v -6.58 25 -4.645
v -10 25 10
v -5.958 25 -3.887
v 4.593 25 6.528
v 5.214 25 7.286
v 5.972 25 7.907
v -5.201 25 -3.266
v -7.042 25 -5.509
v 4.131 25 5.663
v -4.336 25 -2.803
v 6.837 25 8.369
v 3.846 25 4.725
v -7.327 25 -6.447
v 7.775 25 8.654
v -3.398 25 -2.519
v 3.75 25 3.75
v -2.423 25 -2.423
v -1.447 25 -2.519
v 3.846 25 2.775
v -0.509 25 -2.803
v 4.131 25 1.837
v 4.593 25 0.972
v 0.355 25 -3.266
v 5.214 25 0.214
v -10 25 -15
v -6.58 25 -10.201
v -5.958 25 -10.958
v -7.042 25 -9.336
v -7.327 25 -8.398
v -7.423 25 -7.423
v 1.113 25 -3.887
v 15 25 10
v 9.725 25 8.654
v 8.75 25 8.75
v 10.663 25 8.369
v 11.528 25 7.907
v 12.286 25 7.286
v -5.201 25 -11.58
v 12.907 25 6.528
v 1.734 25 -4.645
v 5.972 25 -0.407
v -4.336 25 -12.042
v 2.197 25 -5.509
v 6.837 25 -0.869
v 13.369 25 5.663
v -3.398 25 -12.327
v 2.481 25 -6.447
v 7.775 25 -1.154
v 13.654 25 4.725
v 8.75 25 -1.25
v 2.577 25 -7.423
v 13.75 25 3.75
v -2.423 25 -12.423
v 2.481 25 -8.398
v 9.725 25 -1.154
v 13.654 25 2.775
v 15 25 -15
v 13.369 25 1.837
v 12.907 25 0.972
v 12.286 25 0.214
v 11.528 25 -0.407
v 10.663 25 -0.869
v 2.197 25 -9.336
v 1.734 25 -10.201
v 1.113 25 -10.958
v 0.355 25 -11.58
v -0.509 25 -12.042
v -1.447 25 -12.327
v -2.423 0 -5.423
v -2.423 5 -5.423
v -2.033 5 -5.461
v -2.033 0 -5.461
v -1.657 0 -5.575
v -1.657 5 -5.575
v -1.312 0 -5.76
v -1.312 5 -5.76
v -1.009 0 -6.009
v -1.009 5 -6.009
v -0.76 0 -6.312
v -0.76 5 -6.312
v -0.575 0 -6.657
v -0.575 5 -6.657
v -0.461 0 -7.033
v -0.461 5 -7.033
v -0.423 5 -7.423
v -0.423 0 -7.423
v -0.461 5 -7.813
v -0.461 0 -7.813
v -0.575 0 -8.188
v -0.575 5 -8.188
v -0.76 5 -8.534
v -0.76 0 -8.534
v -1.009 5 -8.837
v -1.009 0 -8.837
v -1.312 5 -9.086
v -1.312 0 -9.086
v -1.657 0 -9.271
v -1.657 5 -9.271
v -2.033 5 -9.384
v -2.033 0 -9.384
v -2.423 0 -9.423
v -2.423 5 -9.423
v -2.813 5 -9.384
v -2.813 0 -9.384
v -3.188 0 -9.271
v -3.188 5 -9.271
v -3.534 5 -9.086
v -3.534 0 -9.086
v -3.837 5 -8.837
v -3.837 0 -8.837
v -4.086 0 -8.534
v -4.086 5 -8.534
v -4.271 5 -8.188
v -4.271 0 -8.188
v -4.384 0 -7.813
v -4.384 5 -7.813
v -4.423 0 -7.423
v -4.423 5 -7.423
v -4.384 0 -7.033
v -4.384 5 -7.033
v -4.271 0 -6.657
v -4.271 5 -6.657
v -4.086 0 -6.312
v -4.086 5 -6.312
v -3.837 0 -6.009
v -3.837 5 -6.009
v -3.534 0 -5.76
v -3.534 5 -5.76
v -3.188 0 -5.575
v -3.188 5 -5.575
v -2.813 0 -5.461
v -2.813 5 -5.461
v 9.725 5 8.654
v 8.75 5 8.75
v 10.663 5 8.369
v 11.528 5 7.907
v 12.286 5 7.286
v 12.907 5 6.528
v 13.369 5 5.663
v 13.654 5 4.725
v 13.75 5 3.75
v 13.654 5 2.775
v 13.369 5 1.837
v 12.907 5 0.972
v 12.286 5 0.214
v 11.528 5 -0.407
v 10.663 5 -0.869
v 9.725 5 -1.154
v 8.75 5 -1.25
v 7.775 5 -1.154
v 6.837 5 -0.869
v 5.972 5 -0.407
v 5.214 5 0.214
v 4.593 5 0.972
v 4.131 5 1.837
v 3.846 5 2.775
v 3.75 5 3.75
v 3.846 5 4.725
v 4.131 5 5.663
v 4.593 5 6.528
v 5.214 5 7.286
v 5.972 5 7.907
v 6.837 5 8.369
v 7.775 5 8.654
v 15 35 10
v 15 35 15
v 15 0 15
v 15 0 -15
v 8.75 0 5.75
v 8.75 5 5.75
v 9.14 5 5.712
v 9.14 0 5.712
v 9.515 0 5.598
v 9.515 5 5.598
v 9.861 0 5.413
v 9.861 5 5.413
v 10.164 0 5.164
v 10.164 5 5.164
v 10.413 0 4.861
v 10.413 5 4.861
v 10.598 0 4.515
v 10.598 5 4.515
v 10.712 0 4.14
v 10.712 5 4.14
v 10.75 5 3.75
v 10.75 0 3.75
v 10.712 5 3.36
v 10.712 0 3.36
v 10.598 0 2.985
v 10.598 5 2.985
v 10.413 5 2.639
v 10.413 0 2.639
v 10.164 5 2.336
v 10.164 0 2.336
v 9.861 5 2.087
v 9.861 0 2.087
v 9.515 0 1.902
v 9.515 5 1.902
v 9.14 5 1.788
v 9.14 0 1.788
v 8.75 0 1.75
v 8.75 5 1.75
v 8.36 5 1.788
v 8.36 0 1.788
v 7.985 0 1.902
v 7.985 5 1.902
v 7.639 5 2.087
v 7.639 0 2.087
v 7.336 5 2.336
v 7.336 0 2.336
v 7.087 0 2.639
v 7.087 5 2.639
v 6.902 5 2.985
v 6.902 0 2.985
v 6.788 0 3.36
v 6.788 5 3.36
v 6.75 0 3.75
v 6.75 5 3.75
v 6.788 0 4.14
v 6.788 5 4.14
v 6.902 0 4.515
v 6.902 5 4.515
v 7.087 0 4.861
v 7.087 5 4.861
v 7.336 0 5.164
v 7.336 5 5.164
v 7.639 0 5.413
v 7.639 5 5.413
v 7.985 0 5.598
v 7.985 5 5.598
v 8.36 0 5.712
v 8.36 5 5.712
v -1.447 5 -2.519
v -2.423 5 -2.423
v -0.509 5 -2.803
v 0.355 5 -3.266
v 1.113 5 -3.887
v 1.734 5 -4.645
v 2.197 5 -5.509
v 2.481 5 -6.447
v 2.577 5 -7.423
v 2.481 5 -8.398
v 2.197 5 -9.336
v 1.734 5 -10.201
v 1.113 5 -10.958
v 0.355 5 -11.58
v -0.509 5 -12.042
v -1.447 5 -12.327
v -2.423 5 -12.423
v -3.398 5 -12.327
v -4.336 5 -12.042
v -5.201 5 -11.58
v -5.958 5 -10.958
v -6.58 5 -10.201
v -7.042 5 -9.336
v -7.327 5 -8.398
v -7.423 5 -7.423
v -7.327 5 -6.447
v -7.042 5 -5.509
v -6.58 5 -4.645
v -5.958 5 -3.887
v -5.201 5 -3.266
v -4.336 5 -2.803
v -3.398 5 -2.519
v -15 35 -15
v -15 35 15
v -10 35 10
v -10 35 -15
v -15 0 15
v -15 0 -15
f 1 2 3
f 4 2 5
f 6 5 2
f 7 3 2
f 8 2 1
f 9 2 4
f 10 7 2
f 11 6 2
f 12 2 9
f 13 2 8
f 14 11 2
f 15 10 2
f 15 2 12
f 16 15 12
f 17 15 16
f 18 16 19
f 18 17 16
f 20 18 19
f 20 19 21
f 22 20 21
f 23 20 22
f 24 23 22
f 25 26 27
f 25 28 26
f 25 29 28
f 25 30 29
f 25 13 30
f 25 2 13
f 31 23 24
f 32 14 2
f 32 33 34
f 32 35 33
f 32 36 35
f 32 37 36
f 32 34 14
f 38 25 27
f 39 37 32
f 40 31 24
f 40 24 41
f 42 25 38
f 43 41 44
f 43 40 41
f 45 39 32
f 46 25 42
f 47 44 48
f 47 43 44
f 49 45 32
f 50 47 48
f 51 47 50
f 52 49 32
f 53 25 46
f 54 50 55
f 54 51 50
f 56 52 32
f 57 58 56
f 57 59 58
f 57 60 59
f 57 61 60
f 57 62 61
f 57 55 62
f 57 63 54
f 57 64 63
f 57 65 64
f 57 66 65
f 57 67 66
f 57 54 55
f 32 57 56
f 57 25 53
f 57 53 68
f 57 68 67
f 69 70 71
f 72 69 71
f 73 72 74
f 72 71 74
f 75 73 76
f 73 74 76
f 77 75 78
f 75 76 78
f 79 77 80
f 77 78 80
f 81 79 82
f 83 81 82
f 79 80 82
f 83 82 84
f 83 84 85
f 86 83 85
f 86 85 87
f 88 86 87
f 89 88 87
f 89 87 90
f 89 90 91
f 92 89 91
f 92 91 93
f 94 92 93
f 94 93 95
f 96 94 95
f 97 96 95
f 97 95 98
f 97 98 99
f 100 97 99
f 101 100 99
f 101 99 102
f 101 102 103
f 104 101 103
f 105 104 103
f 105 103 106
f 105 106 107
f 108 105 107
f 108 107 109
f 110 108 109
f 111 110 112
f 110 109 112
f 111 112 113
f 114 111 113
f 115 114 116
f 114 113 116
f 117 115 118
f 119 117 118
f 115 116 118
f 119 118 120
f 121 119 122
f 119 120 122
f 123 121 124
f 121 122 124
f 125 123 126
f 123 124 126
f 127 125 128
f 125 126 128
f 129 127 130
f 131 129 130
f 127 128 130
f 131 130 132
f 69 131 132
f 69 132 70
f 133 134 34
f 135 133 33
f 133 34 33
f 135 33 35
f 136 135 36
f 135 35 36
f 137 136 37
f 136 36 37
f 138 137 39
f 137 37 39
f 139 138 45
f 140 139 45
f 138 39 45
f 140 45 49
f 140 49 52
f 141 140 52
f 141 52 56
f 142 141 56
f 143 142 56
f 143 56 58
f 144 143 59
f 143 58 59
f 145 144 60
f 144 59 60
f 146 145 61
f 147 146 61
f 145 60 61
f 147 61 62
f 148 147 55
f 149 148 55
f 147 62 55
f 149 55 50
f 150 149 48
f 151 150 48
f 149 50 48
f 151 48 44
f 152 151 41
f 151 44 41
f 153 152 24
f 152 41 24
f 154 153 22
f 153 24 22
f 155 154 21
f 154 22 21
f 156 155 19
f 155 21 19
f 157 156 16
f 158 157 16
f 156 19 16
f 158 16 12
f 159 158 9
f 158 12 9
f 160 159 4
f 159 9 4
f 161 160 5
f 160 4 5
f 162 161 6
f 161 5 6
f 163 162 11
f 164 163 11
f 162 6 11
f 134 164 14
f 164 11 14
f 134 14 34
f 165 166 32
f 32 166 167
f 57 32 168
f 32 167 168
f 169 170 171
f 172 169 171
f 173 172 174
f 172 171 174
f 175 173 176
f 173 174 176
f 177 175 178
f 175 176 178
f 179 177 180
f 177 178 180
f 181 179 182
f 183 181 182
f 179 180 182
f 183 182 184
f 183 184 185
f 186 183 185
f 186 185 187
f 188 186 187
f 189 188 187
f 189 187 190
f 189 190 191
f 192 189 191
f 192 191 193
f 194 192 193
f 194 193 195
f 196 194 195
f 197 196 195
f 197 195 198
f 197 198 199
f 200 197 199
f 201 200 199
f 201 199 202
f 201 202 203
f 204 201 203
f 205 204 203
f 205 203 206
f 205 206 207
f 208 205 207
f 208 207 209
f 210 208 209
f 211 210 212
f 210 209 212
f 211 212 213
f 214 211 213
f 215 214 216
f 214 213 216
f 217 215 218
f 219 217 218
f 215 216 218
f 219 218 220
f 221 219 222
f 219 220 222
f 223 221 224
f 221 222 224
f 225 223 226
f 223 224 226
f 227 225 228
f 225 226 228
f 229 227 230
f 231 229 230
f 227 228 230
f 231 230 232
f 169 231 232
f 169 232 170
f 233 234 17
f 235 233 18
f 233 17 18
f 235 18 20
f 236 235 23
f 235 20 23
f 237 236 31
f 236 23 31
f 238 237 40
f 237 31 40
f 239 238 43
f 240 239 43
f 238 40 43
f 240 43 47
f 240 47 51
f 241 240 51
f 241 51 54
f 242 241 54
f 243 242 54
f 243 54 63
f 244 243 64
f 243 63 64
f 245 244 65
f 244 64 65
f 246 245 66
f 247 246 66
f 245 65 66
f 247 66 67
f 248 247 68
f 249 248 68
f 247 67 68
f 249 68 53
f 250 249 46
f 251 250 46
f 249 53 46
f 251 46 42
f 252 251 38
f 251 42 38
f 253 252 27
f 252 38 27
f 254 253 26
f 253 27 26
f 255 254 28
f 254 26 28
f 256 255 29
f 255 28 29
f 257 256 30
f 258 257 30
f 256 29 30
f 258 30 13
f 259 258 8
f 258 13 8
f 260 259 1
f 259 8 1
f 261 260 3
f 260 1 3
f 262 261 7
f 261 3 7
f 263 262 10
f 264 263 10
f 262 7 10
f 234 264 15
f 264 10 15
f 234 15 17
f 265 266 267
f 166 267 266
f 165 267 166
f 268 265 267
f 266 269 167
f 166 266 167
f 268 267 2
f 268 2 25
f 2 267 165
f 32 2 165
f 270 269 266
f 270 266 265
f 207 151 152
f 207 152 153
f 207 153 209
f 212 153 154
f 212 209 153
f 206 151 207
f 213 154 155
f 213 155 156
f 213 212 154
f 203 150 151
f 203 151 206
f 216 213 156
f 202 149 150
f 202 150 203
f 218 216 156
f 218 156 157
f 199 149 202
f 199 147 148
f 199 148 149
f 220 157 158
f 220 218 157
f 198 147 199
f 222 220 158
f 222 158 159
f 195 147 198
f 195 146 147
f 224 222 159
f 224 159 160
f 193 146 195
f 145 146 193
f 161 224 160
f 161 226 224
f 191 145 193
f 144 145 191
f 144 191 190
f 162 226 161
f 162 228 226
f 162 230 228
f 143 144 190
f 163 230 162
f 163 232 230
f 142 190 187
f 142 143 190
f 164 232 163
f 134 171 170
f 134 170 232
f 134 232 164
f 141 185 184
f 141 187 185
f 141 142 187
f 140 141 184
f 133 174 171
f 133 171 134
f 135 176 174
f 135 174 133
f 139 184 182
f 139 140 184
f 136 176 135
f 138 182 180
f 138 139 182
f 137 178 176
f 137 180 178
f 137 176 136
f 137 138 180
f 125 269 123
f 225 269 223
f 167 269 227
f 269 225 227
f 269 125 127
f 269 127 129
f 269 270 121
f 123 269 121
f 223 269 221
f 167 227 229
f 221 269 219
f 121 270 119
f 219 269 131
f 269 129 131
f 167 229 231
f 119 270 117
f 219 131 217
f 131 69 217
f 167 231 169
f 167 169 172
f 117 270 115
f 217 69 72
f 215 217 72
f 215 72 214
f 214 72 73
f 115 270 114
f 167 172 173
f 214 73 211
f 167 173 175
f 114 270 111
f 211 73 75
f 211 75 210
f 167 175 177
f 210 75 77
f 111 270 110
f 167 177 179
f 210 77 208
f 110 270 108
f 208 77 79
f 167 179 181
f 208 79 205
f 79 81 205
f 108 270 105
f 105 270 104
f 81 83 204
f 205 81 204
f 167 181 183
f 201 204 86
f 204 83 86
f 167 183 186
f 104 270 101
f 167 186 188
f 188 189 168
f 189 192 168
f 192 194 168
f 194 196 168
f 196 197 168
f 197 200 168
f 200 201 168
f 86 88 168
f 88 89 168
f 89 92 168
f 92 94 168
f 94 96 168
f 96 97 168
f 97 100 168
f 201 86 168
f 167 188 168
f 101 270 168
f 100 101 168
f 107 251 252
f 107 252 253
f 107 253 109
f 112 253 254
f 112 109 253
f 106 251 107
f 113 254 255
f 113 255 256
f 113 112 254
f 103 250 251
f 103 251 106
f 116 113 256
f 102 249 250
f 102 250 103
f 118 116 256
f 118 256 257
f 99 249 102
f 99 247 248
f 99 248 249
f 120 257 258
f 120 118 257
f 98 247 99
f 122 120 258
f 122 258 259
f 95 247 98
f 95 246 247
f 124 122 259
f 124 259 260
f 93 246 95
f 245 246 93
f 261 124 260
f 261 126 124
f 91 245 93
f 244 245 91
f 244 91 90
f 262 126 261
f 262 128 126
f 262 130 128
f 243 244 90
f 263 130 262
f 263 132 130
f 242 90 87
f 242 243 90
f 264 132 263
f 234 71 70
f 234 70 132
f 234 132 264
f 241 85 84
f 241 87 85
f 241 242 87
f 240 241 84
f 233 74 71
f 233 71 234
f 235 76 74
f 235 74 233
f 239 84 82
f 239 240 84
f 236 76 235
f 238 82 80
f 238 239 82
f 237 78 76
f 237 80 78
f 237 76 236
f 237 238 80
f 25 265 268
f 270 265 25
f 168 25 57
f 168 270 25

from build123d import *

# Parameters (mm, degrees)
SKETCH1_W           = 30
SKETCH1_H           = 30
BOSS_EXTRUDE2_DEPTH = 35
SKETCH2_W           = 25
SKETCH2_H           = 25
CUT_EXTRUDE1_DEPTH  = 10
SKETCH3_R           = 5
SKETCH3_R_2         = 2
CUT_EXTRUDE4_DEPTH  = 20
SKETCH5_R           = 2
CUT_EXTRUDE5_DEPTH  = 25


with BuildPart() as part:
    # Sketch1 → Boss-Extrude2 (new body)
    with BuildSketch(Plane(origin=(0, 0, 0), x_dir=(1, 0, 0), z_dir=(0, 1, 0))):
        Rectangle(SKETCH1_W, SKETCH1_H)
    extrude(amount=BOSS_EXTRUDE2_DEPTH)

    # Sketch2 → Cut-Extrude1 (cut)
    with BuildSketch(Plane(origin=(0, 35, 0), x_dir=(1, 0, 0), z_dir=(0, 1, 0))):
        with Locations((2.5, 2.5)):
            Rectangle(SKETCH2_W, SKETCH2_H)
    extrude(amount=-CUT_EXTRUDE1_DEPTH, mode=Mode.SUBTRACT)

    # Sketch3 → Cut-Extrude4 (cut)
    # profile 1 of 2: a face of its own
    with BuildSketch(Plane(origin=(0, 25, 0), x_dir=(1, 0, 0), z_dir=(0, 1, 0))):
        with Locations(Location((-2.422862762, 7.422862762, 0), (0, 0, 270))):
            Circle(SKETCH3_R)
        with Locations(Location((-2.422862762, 7.422862762, 0), (0, 0, 270))):
            Circle(SKETCH3_R_2, mode=Mode.SUBTRACT)
    # profile 2 of 2: a face of its own
    with BuildSketch(Plane(origin=(0, 25, 0), x_dir=(1, 0, 0), z_dir=(0, 1, 0))):
        with Locations(Location((8.75, -3.75, 0), (0, 0, 270))):
            Circle(SKETCH3_R)
        with Locations(Location((8.75, -3.75, 0), (0, 0, 270))):
            Circle(SKETCH3_R_2, mode=Mode.SUBTRACT)
    extrude(amount=-CUT_EXTRUDE4_DEPTH, mode=Mode.SUBTRACT)

    # Sketch5 → Cut-Extrude5 (cut)
    with BuildSketch(Plane(origin=(0, 25, 0), x_dir=(1, 0, 0), z_dir=(0, 1, 0))):
        with Locations(Location((-2.422862762, 7.422862762, 0), (0, 0, 270))):
            Circle(SKETCH5_R)
        with Locations(Location((8.75, -3.75, 0), (0, 0, 270))):
            Circle(SKETCH5_R)
    extrude(amount=-CUT_EXTRUDE5_DEPTH, mode=Mode.SUBTRACT)


solid = part.part
